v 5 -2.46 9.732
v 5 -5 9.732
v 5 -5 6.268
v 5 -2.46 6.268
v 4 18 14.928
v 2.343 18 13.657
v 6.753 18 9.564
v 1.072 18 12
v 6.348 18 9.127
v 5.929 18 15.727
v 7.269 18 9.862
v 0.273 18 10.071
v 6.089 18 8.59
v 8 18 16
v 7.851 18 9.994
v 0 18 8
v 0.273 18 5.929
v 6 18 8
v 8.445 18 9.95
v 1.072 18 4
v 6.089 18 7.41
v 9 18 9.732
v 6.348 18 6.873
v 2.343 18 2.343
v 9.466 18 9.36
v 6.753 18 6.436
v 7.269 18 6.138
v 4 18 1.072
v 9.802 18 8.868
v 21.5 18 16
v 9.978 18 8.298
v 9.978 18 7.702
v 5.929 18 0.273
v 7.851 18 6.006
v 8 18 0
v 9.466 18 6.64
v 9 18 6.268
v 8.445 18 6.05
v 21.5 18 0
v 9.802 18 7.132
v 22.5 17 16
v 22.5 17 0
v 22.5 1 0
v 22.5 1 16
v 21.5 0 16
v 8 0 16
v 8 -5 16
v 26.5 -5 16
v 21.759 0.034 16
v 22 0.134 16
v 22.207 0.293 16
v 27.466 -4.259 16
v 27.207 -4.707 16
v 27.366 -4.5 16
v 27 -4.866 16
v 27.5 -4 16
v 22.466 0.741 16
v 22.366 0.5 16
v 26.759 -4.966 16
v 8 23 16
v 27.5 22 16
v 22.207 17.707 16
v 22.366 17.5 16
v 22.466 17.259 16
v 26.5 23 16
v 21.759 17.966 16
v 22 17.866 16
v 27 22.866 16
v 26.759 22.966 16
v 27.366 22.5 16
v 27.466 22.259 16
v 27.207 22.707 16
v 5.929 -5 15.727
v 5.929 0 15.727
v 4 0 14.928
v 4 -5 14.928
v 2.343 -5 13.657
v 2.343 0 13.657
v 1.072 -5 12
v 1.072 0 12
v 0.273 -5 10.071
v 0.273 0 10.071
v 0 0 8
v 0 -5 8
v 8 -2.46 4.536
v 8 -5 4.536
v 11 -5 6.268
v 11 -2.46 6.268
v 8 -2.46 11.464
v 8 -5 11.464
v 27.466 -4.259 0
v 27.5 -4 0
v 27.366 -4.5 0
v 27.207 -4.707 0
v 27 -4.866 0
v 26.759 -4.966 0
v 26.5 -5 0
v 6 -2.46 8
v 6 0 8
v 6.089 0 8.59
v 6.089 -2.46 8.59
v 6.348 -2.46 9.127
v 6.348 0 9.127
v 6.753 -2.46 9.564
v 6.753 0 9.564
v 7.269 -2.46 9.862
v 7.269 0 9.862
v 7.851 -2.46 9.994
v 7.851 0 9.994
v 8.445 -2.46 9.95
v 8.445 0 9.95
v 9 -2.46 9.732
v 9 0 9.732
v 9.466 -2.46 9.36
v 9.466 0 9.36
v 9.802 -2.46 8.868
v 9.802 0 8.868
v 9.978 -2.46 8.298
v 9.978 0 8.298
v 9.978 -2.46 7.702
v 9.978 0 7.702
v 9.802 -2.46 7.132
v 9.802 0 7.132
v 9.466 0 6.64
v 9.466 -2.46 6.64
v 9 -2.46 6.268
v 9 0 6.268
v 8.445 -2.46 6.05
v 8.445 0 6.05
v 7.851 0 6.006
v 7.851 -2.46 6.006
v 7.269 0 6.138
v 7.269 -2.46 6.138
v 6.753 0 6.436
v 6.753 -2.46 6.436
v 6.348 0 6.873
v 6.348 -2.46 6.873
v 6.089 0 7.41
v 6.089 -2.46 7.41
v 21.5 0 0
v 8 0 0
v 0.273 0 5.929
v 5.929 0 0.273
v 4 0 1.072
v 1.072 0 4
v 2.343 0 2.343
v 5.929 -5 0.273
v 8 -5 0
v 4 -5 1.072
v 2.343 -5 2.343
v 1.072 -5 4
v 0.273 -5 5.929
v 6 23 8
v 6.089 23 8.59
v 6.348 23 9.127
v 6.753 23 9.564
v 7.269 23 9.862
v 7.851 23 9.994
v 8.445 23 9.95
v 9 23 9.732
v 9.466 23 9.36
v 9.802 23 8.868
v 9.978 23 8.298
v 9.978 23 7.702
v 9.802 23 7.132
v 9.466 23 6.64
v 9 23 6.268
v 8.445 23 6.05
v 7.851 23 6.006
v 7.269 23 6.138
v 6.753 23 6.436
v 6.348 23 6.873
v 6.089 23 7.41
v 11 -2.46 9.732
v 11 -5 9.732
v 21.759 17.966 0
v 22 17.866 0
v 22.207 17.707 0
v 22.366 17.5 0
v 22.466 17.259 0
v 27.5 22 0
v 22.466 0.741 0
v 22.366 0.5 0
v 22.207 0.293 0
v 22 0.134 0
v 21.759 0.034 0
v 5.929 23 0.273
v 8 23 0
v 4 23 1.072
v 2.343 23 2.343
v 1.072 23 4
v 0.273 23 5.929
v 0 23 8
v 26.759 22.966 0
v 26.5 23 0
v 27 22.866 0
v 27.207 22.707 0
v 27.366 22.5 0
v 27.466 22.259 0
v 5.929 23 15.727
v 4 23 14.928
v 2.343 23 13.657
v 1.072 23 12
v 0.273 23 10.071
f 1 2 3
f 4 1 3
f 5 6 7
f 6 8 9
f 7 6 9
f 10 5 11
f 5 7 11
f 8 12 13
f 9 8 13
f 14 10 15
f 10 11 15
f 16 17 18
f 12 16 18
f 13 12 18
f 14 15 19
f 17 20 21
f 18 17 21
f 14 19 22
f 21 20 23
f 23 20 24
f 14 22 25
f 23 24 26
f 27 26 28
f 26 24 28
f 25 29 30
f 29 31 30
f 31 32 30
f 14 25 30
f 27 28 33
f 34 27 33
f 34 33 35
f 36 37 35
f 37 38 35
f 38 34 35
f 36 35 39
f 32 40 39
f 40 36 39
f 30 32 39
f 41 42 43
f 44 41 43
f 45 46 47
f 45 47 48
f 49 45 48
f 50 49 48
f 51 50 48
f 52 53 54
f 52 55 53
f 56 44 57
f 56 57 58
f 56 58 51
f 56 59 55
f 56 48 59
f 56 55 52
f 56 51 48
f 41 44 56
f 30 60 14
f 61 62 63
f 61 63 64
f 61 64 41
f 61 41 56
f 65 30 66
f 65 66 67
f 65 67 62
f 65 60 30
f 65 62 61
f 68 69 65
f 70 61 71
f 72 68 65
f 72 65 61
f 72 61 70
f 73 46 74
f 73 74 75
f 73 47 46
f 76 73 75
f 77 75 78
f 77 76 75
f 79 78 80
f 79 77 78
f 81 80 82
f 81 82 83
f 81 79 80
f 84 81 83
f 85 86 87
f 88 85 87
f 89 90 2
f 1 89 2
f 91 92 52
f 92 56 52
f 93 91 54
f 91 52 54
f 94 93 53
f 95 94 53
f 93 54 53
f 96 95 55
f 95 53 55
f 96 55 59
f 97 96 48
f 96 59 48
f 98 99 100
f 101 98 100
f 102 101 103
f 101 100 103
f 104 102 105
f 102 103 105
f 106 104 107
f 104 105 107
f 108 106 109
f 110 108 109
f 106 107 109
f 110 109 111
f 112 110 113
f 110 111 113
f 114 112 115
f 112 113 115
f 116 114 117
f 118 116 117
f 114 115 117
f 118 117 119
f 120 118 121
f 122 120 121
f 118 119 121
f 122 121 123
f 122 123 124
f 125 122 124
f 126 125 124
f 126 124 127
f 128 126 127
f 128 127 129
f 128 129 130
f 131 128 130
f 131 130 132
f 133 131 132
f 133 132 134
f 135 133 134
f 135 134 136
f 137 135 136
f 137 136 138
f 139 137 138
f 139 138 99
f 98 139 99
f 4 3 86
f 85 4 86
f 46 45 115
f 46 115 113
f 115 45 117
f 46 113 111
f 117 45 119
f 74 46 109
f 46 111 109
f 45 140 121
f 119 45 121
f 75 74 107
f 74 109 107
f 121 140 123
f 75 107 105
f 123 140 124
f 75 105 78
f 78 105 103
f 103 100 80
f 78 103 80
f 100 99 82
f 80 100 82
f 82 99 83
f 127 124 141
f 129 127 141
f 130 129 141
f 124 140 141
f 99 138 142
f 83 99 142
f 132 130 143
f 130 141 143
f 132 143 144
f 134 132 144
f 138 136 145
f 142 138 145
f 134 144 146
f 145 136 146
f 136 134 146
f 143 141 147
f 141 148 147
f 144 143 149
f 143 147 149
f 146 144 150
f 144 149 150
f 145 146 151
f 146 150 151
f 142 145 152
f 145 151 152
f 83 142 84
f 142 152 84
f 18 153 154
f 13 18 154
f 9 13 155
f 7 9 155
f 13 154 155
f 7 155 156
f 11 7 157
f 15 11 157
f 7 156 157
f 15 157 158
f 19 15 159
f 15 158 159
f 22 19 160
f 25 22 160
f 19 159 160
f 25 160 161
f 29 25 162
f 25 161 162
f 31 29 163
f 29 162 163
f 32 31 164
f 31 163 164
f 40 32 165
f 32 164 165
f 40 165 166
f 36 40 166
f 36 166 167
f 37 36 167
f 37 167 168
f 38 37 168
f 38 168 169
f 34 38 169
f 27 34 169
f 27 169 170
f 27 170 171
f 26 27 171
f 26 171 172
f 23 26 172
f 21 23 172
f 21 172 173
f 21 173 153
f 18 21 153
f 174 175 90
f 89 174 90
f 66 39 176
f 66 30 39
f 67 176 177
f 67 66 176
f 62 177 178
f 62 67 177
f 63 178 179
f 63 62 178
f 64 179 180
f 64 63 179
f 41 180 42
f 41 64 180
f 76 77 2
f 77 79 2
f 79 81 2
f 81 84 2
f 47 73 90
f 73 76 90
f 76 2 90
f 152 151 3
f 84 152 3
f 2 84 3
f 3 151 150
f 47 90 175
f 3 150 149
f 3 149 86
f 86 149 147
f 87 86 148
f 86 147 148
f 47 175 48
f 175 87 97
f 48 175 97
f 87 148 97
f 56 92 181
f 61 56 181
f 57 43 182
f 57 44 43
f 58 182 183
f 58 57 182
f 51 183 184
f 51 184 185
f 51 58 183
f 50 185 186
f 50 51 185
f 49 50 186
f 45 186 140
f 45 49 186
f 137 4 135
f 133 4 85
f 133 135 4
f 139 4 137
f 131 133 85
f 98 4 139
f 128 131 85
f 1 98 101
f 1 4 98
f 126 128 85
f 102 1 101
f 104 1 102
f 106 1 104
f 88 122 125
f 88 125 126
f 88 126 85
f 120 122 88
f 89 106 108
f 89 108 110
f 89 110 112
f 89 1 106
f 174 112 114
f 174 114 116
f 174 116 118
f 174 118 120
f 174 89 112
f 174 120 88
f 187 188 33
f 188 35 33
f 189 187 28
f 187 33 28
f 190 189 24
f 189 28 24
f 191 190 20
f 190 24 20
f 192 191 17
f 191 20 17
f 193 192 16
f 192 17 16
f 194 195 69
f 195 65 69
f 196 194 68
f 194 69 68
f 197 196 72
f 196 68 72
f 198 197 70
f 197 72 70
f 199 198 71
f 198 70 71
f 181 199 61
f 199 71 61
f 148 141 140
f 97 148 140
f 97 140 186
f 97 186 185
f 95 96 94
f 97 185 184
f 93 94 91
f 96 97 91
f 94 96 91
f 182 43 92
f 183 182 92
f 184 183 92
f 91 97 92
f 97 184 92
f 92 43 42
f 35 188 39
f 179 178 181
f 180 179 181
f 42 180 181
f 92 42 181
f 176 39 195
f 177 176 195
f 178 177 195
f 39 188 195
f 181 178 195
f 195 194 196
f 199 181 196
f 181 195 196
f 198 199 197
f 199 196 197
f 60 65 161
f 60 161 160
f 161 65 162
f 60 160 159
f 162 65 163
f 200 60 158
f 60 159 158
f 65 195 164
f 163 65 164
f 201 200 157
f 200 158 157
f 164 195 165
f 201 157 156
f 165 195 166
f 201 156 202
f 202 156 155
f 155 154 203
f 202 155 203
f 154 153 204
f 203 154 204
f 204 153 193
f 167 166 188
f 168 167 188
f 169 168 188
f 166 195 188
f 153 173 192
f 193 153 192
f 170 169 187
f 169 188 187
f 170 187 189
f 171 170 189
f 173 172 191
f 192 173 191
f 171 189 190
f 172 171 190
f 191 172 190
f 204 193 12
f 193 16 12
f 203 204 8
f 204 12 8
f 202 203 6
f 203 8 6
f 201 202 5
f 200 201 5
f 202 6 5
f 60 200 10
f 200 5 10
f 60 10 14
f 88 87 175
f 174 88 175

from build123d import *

# Parameters (mm, degrees)
F1_DEPTH = 16
F3_D     = 4
F3_DEPTH = 30
F3_TIP   = 1.2017212381
F4_R     = 1
F5_R     = 7.99999
F6_DEPTH = 2.54


# Not quite as in the source:
# - a fillet or chamfer is up to 0.001 mm smaller than in the source, because OpenCascade refuses the exact size


with BuildPart() as f1:
    # F0 (on Top) → F1 (new body)
    with BuildSketch(Plane.XY):
        Polygon((0, 23), (0, 18), (22.5, 18), (22.5, 0), (0, 0), (0, -5), (27.5, -5), (27.5, 23), align=None)
    extrude(amount=F1_DEPTH)

    # F3
    with Locations(Plane.XZ.offset(5)):
        with Locations((8, 8)):
            Hole(F3_D / 2, depth=F3_DEPTH)
            with Locations((0, 0, -(F3_DEPTH + F3_TIP / 2))):  # 118° drill point
                Cone(0, F3_D / 2, F3_TIP, mode=Mode.SUBTRACT)

    # F4
    f4_edges = [f1.edges().sort_by_distance(p)[0] for p in [
        (22.5, 18, 8),
        (22.5, 0, 8),
        (27.5, -5, 8),
        (27.5, 23, 8),
    ]]
    fillet(f4_edges, radius=F4_R)

    # F5 (radius 8 in the source; OpenCascade refuses exactly that, so slightly less here)
    f5_edges = [f1.edges().sort_by_distance(p)[0] for p in [
        (0, -2.5, 16),
        (0, 20.5, 16),
        (0, -2.5, 0),
        (0, 20.5, 0),
    ]]
    fillet(f5_edges, radius=F5_R)

    # F2 (on face) → F6 (cut)
    with BuildSketch(Plane.XZ.offset(5)):
        Polygon((11, 6.2679491924), (11, 9.7320508076), (8, 11.4641016151), (5, 9.7320508076), (5, 6.2679491924), (8, 4.5358983849), align=None)
    extrude(amount=-F6_DEPTH, mode=Mode.SUBTRACT)


solid = f1.part
